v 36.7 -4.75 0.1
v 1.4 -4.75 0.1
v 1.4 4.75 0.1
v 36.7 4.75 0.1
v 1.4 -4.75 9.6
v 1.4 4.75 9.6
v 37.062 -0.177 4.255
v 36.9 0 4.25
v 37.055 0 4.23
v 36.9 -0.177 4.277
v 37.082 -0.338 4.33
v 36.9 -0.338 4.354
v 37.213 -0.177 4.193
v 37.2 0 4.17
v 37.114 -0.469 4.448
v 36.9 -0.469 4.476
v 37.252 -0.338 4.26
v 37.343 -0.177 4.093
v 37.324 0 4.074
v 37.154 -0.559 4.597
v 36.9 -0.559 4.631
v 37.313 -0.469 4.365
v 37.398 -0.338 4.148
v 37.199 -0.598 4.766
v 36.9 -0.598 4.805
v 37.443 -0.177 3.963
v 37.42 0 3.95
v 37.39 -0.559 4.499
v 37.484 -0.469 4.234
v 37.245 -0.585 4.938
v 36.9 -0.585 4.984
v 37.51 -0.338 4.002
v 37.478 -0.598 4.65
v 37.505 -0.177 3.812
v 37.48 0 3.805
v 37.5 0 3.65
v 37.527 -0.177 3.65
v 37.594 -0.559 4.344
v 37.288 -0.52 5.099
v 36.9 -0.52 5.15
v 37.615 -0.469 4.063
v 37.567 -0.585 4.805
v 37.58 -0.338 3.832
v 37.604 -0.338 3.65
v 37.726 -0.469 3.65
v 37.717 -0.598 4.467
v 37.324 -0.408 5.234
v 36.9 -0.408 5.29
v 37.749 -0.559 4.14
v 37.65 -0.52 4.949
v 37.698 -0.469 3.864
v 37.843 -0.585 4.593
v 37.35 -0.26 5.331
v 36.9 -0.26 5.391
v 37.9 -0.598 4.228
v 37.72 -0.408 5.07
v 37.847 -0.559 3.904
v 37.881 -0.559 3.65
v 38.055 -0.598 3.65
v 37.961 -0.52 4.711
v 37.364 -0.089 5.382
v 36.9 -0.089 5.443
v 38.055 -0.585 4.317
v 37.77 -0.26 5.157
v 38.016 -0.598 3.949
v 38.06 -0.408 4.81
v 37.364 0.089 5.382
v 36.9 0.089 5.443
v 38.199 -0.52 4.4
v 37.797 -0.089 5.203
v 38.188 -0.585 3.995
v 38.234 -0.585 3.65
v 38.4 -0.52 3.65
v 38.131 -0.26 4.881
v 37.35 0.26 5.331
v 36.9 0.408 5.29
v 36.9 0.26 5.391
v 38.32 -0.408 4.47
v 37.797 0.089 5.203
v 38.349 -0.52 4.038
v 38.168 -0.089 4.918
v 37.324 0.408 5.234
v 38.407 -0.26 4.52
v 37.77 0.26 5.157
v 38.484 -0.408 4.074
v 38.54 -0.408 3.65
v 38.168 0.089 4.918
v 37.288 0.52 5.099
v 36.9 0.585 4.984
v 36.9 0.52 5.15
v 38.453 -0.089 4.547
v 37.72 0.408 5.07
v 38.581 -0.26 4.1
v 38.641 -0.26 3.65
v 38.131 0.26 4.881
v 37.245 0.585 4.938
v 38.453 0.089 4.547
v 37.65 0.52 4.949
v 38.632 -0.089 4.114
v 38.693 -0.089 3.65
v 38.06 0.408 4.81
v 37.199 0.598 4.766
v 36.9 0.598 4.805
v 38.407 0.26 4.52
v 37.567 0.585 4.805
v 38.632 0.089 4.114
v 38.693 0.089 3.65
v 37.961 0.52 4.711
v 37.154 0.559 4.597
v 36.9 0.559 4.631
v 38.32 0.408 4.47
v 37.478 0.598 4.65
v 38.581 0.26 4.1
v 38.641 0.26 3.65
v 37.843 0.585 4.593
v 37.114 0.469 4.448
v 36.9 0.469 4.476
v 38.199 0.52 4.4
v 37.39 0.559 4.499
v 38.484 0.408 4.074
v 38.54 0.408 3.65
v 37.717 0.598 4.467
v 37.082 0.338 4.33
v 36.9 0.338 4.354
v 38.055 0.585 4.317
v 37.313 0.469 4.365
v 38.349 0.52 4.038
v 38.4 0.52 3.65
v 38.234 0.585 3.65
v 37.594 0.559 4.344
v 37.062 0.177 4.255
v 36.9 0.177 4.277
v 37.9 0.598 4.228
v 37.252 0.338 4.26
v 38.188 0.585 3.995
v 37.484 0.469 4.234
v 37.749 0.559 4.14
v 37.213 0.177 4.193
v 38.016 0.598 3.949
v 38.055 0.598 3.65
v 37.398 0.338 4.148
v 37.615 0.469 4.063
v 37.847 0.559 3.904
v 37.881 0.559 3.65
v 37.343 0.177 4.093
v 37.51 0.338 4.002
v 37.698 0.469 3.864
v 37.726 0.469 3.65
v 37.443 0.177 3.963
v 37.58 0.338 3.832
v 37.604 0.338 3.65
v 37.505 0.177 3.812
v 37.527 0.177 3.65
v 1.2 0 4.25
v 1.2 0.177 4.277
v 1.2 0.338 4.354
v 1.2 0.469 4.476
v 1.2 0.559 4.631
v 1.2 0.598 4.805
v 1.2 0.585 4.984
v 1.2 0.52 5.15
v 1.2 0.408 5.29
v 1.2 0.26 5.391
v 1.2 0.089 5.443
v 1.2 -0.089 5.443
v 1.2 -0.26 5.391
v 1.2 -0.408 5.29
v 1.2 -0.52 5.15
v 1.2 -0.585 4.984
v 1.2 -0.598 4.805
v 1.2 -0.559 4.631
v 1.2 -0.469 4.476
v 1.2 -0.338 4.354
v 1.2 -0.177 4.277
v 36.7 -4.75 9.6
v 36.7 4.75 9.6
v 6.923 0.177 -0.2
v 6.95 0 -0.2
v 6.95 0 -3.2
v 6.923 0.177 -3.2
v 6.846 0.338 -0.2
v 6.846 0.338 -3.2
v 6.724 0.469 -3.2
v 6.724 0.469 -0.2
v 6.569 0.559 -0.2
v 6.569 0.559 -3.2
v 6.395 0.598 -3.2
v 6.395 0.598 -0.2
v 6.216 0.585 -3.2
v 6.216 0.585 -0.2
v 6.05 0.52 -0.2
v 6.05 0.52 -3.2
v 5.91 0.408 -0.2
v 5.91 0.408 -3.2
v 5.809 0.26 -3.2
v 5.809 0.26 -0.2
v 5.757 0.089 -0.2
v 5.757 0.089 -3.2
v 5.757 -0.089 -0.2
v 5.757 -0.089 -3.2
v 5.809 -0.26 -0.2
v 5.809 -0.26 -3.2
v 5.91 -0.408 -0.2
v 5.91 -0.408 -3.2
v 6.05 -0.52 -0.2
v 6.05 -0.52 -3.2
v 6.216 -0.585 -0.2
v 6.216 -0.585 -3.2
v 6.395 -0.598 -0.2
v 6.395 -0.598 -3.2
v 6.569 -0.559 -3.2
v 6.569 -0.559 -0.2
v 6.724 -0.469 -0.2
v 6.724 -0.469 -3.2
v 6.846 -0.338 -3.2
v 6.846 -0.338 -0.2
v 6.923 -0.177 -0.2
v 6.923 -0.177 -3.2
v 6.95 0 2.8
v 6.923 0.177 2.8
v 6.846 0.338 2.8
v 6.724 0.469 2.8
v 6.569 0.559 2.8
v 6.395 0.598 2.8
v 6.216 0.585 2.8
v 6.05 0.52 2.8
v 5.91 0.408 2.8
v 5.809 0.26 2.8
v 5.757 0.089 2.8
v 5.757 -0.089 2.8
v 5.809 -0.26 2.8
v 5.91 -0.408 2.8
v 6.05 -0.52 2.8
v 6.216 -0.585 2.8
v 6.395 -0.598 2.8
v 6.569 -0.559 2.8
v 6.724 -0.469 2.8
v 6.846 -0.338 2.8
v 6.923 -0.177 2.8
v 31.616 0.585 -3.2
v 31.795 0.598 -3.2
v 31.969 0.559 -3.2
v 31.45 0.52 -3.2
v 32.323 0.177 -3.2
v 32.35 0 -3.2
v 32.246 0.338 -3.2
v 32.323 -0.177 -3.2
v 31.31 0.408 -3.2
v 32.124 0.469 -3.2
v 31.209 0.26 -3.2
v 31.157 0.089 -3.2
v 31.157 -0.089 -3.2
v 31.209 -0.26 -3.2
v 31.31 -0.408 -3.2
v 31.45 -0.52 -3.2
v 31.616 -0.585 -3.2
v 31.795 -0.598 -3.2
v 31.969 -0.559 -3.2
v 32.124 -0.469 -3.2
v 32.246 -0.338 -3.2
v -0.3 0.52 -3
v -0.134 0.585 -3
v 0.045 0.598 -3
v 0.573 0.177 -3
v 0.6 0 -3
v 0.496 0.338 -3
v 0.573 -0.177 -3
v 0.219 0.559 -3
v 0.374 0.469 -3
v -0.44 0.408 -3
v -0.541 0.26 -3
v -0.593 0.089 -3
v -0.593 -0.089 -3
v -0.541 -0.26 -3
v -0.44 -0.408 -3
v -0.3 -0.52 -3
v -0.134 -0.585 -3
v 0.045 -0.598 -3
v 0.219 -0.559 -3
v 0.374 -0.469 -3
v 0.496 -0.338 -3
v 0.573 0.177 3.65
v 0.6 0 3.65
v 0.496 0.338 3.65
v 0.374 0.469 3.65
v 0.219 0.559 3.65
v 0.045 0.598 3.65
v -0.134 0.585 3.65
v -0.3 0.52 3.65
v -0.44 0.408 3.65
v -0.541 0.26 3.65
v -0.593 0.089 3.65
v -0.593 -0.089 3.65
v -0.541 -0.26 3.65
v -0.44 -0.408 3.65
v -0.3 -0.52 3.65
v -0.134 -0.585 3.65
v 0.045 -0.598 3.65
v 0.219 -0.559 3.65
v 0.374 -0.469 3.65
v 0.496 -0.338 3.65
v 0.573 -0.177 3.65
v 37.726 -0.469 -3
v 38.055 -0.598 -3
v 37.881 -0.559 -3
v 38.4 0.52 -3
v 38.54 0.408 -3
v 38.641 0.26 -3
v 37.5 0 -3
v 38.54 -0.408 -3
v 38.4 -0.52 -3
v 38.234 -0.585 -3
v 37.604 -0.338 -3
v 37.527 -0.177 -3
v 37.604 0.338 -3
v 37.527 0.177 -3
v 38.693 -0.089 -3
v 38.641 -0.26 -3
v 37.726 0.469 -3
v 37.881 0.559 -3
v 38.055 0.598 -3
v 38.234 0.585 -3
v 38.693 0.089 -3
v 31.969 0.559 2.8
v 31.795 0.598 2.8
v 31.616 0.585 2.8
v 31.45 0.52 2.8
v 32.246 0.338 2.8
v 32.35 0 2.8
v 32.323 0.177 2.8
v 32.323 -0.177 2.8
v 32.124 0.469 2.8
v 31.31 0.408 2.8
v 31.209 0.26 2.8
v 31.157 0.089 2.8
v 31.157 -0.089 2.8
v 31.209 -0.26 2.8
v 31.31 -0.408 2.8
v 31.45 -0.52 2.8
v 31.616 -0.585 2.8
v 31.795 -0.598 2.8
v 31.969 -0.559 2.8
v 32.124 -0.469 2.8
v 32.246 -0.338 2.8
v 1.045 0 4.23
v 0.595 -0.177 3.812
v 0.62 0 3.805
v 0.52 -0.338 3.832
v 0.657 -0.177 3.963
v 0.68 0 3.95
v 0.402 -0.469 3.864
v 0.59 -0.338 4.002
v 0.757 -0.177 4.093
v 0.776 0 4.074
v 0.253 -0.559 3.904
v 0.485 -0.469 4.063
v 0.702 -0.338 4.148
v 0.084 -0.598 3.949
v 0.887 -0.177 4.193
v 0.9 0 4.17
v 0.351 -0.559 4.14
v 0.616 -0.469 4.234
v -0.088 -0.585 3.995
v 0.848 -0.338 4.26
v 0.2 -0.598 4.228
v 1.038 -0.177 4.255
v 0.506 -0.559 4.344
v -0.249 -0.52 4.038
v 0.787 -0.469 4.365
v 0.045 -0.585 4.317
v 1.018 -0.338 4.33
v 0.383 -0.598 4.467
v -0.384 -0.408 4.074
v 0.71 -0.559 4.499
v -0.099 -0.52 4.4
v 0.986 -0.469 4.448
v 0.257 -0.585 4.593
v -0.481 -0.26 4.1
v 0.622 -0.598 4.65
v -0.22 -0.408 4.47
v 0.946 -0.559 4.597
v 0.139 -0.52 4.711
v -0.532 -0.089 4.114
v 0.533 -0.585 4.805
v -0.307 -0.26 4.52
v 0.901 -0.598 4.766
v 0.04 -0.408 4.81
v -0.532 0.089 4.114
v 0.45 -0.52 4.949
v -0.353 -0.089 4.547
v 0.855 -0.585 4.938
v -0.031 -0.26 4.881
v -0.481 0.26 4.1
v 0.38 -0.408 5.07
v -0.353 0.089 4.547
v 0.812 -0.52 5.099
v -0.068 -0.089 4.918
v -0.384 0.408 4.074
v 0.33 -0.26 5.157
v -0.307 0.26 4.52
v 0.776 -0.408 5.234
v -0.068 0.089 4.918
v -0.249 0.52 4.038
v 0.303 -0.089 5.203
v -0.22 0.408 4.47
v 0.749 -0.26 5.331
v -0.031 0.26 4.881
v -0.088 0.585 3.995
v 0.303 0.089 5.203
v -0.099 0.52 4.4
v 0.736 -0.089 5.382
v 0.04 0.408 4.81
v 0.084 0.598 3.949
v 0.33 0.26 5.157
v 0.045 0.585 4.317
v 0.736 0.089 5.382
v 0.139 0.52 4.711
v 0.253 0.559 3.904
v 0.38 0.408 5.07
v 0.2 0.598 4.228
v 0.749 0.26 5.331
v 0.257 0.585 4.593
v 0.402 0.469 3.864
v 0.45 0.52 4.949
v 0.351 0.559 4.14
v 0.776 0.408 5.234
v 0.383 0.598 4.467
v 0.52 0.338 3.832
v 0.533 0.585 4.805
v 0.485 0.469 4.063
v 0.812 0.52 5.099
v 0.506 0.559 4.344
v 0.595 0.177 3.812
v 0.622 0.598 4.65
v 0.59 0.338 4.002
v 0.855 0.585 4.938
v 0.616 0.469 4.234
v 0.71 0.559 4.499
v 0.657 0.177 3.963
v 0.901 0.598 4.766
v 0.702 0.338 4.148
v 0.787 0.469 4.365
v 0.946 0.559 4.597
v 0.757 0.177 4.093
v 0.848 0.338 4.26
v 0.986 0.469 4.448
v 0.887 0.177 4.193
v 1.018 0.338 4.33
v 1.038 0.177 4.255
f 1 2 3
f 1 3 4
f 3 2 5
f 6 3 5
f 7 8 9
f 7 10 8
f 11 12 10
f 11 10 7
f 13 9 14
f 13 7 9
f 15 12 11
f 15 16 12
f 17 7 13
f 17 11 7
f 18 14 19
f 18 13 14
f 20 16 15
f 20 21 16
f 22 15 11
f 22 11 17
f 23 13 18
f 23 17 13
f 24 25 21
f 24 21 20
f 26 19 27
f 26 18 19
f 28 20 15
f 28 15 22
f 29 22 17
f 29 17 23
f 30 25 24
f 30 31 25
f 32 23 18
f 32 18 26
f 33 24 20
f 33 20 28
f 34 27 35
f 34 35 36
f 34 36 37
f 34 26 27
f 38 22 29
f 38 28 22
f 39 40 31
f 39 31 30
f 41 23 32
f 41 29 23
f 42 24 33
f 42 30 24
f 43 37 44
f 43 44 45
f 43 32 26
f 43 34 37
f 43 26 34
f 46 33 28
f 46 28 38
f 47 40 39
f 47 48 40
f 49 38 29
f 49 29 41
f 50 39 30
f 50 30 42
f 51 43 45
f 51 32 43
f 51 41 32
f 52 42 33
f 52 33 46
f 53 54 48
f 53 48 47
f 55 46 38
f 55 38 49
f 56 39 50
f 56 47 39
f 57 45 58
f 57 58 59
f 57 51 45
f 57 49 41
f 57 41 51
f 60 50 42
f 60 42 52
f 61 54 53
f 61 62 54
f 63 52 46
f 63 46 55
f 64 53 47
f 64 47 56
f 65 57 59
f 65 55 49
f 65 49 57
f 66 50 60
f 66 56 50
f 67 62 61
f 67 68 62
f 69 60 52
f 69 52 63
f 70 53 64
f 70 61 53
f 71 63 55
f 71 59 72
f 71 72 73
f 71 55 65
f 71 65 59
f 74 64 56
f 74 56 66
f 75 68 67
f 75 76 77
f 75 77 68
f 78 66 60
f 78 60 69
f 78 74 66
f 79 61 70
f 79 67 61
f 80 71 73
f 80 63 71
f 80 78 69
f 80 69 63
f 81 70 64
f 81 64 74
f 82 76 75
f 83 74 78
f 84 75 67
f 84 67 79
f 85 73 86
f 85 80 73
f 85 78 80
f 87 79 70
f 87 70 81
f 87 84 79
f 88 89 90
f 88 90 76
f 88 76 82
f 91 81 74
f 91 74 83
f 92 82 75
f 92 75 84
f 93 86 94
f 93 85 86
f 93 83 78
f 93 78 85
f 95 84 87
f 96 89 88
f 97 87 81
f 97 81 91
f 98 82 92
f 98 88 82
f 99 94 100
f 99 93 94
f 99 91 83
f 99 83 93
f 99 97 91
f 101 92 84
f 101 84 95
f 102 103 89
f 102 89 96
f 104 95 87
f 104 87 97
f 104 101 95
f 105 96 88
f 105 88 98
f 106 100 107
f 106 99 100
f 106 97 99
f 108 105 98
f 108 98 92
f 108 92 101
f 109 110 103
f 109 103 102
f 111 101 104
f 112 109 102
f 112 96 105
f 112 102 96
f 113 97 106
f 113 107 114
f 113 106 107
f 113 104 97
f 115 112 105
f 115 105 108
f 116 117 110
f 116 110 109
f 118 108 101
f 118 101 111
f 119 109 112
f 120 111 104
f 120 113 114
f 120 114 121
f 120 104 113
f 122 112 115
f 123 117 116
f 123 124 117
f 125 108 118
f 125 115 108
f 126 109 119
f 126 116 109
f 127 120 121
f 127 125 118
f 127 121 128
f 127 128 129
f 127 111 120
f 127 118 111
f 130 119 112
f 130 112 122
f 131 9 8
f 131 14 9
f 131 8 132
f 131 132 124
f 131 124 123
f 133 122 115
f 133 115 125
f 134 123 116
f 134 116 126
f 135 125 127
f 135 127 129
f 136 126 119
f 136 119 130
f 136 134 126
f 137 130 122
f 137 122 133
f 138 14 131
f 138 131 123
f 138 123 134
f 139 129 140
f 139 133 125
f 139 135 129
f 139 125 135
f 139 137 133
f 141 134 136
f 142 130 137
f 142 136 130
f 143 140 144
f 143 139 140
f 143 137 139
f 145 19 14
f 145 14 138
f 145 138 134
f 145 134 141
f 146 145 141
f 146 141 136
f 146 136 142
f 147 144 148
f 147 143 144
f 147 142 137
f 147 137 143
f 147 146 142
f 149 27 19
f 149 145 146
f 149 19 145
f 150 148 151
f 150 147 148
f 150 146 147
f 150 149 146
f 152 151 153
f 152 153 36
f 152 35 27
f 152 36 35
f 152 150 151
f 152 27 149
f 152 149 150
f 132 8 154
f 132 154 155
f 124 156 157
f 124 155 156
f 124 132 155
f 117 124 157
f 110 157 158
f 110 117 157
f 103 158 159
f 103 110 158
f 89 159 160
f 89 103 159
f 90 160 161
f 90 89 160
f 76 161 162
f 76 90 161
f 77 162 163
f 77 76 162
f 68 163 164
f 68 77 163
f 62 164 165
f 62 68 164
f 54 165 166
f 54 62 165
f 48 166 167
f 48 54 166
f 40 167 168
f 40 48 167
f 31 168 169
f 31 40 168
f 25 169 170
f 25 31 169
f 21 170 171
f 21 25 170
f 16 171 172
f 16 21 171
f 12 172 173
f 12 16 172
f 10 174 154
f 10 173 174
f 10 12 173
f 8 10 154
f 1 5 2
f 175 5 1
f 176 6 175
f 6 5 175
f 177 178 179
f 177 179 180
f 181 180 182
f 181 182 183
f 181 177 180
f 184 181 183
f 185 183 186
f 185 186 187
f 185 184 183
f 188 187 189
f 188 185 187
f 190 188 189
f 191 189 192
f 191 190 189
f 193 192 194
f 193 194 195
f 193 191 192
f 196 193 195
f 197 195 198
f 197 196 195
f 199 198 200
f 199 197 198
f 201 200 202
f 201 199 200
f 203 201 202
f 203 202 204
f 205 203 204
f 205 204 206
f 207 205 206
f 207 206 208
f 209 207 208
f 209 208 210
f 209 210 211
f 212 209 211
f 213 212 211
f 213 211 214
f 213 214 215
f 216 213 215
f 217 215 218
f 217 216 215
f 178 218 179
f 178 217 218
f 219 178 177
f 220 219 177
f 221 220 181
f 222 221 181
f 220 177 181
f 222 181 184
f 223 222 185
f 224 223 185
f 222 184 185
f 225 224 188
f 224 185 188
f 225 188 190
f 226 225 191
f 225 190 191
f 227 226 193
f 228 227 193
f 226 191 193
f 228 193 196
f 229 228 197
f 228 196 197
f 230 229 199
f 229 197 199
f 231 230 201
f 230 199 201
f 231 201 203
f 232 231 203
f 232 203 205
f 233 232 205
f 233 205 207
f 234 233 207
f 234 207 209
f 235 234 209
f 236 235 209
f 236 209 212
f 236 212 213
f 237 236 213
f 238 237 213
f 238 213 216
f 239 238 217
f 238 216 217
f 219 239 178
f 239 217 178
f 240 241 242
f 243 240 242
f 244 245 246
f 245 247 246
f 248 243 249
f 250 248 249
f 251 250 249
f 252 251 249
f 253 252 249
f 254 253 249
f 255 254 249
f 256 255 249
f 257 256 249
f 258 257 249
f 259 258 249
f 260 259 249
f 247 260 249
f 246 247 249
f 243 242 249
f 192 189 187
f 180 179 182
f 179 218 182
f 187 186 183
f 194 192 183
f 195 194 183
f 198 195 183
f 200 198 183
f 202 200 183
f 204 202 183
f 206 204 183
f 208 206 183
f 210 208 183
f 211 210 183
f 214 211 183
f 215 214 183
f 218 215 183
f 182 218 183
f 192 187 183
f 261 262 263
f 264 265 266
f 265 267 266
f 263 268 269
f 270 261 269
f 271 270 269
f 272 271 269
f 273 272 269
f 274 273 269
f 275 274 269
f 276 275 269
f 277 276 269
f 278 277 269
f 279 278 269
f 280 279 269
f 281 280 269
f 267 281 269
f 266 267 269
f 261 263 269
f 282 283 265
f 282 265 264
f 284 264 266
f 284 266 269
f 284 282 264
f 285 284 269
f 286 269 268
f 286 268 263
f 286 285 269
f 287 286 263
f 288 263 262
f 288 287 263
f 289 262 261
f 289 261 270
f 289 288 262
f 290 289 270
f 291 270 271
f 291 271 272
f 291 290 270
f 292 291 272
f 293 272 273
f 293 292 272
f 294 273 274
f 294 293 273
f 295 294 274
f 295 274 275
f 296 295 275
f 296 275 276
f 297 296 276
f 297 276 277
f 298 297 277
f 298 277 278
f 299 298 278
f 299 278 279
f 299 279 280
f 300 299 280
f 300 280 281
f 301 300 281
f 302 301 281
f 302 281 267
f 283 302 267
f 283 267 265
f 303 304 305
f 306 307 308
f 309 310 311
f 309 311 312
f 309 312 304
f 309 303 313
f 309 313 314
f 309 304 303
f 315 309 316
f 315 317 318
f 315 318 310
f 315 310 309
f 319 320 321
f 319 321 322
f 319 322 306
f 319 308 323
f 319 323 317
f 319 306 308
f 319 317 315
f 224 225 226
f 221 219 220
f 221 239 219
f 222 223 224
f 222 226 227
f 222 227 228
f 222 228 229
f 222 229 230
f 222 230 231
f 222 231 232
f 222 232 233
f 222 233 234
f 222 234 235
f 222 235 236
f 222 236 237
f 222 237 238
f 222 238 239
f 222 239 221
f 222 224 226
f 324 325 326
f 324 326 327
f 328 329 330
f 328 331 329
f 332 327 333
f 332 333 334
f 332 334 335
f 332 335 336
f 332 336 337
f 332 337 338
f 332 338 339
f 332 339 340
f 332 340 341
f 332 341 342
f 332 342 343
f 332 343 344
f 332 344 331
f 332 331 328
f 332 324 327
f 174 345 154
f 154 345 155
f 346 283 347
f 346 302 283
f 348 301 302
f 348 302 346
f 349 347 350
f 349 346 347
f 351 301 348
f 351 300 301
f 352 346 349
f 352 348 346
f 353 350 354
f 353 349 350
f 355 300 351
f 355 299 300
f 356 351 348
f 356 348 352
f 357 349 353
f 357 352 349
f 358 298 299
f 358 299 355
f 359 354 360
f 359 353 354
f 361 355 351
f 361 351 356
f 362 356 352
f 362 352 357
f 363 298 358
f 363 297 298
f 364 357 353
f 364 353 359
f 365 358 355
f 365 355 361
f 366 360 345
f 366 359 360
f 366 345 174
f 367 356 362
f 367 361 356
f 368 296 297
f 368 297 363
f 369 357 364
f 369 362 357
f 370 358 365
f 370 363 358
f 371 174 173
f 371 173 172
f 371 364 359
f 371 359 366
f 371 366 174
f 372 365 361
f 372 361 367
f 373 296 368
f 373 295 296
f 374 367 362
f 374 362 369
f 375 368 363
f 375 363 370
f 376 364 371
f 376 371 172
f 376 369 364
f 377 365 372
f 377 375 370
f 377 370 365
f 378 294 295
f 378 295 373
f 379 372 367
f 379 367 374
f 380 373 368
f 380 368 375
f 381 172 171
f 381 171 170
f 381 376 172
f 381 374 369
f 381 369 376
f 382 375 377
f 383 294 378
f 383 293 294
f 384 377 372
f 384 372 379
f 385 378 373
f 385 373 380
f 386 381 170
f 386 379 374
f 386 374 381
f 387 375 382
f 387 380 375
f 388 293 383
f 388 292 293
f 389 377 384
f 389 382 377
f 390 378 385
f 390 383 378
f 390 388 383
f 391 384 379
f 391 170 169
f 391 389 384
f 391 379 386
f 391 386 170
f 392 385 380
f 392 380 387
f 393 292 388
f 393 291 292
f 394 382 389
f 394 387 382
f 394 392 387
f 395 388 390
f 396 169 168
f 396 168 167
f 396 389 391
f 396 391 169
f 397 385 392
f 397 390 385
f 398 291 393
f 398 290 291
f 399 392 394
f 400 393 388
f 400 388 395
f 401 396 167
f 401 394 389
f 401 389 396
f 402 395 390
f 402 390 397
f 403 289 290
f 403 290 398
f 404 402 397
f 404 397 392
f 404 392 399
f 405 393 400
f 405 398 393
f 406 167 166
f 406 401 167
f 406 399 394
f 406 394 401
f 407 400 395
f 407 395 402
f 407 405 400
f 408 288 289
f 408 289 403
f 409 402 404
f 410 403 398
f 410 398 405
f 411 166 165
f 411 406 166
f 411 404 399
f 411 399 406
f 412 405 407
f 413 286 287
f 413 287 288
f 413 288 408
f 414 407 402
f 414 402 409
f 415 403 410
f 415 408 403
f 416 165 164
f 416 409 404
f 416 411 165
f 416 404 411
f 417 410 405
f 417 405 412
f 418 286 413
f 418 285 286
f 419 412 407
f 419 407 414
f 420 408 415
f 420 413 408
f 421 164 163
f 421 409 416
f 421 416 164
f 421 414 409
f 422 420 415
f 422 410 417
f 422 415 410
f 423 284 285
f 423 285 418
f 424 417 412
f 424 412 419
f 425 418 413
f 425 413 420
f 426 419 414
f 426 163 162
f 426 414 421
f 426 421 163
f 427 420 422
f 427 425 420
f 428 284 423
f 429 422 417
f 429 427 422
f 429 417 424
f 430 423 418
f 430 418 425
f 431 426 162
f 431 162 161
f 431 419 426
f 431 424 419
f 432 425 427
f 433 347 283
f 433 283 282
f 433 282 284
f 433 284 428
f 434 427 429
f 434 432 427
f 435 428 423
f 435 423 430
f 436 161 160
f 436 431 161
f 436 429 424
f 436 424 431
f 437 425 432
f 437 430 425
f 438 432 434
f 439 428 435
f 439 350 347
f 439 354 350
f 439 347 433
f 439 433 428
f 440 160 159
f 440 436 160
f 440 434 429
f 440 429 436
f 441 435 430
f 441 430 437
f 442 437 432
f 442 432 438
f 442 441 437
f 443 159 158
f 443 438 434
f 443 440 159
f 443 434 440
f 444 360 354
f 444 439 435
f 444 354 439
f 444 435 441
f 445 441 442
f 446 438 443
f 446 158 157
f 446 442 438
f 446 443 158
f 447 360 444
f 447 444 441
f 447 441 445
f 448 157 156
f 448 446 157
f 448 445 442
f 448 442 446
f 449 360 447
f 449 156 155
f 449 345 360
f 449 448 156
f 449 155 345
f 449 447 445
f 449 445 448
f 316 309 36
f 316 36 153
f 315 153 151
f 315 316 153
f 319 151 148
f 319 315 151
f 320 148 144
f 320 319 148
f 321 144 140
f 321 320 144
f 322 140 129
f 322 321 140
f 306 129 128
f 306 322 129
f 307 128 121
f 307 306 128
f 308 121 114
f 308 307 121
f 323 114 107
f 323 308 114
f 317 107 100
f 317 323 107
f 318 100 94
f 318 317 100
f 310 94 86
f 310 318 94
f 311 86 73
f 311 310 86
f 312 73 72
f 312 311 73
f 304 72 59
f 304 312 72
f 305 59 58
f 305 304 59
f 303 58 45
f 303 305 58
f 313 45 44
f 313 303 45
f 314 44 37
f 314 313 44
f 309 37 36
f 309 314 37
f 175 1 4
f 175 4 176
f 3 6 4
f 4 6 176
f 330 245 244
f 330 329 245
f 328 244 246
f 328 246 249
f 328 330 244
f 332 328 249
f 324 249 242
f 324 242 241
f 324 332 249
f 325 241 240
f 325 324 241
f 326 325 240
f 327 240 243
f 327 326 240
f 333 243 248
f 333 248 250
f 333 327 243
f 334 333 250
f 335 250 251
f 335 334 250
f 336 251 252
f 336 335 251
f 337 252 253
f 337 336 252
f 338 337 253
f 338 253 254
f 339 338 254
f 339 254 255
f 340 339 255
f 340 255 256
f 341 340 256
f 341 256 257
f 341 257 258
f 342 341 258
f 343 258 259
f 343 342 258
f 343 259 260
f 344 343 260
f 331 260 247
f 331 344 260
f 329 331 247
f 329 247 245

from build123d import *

# Parameters (mm, degrees)
SKETCH_R     = 0.6
SKETCH002_W  = 35.3
SKETCH002_H  = 9.5
PAD_DEPTH    = 4.75
SKETCH004_R  = 0.6
PAD001_DEPTH = 3


with BuildPart() as sweep_body:
    # Sweep: sweep along a path in Sketch001
    with BuildLine(Plane.XZ) as sweep_path:
        Line((0, -3), (0, 3.65))
        ThreePointArc((0, 3.65), (0.351468, 4.498524), (1.199988, 4.85))
        Line((1.199988, 4.85), (36.9, 4.85))
        ThreePointArc((36.9, 4.85), (37.748528, 4.498528), (38.1, 3.65))
        Line((38.1, 3.65), (38.1, -3))
    # Sketch → Sweep (sweep)
    with BuildSketch(Plane.XY.offset(-2)):
        Circle(SKETCH_R)
    sweep(path=sweep_path.line)


with BuildPart() as pad:
    # Sketch002 → Pad (new body, symmetric)
    with BuildSketch(Plane.XZ):
        with Locations((19.05, 4.85)):
            Rectangle(SKETCH002_W, SKETCH002_H)
    extrude(amount=PAD_DEPTH, both=True)


with BuildPart() as pad001:
    # Sketch004 → Pad001 (new body, symmetric)
    with BuildSketch(Plane.XY.offset(-0.2)):
        with Locations((6.35, 0)):
            Circle(SKETCH004_R)
        with Locations((31.75, 0)):
            Circle(SKETCH004_R)
    extrude(amount=PAD001_DEPTH, both=True)


solid = Compound([sweep_body.part, pad.part, pad001.part])
